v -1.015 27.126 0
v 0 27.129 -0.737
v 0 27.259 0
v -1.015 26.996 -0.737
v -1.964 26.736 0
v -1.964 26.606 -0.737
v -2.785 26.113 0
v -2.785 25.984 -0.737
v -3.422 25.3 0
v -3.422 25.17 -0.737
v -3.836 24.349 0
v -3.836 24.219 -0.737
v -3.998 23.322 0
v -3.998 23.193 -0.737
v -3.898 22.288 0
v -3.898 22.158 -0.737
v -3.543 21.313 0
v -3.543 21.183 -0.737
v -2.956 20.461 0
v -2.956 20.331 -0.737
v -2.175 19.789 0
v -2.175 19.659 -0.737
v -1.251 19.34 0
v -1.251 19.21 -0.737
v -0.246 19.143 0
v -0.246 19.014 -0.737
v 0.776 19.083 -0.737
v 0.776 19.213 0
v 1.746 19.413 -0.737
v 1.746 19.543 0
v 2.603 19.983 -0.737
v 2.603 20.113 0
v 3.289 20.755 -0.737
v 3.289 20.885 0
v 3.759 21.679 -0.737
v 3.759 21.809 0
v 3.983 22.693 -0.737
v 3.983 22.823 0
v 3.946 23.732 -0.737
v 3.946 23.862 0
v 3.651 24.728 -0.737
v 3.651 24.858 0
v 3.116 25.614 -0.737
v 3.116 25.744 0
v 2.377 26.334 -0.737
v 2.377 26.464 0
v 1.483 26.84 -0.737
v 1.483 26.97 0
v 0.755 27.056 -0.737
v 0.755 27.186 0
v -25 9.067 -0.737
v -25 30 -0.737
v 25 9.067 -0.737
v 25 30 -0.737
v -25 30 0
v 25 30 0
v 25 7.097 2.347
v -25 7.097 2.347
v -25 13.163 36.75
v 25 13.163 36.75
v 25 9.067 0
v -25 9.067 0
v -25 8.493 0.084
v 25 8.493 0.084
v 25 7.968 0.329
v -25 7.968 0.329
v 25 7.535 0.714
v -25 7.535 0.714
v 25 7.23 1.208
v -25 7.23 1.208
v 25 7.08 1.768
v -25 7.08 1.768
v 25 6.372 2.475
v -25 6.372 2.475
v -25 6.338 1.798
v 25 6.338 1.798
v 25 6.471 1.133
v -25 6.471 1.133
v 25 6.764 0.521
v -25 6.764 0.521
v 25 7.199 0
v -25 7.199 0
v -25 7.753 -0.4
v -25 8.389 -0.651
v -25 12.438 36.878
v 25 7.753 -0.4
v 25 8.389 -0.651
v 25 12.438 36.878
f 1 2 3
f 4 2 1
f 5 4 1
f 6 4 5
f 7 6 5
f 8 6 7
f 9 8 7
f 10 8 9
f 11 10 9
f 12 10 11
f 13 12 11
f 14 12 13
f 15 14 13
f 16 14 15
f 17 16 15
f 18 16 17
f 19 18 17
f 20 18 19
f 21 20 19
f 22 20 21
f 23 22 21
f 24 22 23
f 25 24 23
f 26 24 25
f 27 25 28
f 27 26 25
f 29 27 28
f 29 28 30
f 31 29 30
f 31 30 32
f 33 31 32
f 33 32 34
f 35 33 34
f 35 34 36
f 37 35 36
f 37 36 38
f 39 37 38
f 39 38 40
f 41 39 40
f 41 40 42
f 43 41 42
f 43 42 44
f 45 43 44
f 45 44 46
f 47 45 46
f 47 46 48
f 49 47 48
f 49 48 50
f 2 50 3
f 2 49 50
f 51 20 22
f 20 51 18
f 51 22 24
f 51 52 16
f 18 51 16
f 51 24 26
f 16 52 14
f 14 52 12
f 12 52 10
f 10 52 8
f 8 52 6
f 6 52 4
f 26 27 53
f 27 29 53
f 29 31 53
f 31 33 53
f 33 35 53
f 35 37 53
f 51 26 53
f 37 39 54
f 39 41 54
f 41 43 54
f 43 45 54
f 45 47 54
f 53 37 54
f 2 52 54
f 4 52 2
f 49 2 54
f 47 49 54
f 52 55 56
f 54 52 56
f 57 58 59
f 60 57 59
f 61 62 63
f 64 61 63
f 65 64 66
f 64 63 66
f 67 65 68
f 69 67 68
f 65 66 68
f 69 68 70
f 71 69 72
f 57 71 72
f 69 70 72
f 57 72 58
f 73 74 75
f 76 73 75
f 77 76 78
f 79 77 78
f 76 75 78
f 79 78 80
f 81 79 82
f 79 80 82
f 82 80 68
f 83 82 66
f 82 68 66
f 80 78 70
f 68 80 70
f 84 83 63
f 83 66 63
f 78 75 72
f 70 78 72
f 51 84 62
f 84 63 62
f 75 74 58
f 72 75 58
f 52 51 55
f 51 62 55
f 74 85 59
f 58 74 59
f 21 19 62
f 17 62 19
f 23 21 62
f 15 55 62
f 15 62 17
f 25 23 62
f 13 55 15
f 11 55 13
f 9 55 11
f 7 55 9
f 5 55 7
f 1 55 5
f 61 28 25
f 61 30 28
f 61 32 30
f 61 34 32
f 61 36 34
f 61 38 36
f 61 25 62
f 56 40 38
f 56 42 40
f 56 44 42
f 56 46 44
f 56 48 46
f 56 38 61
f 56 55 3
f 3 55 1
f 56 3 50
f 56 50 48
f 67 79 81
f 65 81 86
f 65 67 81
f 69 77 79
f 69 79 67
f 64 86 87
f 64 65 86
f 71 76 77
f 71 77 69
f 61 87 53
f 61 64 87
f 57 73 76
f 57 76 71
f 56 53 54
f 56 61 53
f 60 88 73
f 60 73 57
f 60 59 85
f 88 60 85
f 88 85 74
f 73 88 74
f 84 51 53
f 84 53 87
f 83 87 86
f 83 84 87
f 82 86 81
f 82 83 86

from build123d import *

# Parameters (mm, degrees)
SKETCH1_W               = 50
SKETCH1_H               = 60
BASE_FLANGE1_DEPTH      = 0.7366
SKETCHED_START          = -25
SKETCHED_BEND1_DEPTH    = 50
SKETCHED_BEND1_2_DEPTH  = 50
CUT_EXTRUDE1_DEPTH      = 54.090671485
CUT_EXTRUDE1_DEPTH_BACK = 54.090671485
SKETCH8_R               = 4


# Read off the part's stored shape, not the designer's step: Sketched Bend1
# Sheet-metal steps are written as plain solids
with BuildPart() as part:
    # Sketch1 → Base-Flange1 (new body)
    with BuildSketch(Plane.XY):
        Rectangle(SKETCH1_W, SKETCH1_H)
    extrude(amount=-BASE_FLANGE1_DEPTH)

    # Sketched Bend1 outline → Sketched Bend1 (cut)
    with BuildSketch(Plane.YZ.offset(SKETCHED_START)):
        with BuildLine():
            ThreePointArc((9.066731634, -0.7366), (8.062794494, -0.545798456), (7.198850599, 0))
            Line((7.198850599, 0), (-30, 0))
            Line((-30, 0), (-30, -0.7366))
            Line((-30, -0.7366), (9.066731634, -0.7366))
        make_face()
    extrude(amount=SKETCHED_BEND1_DEPTH, mode=Mode.SUBTRACT)

    # Sketched Bend1 2 outline → Sketched Bend1 2 (add)
    with BuildSketch(Plane.YZ.offset(SKETCHED_START)):
        with BuildLine():
            Line((13.163214519, 36.74984988), (12.437805129, 36.877759128))
            Line((12.437805129, 36.877759128), (6.371706737, 2.475205603))
            ThreePointArc((6.371706737, 2.475205603), (6.471218519, 1.132652762), (7.198850599, 0))
            Line((7.198850599, 0), (9.066731634, 0))
            ThreePointArc((9.066731634, 0), (7.534642748, 0.714424781), (7.097116128, 2.347296355))
            Line((7.097116128, 2.347296355), (13.163214519, 36.74984988))
        make_face()
    extrude(amount=SKETCHED_BEND1_2_DEPTH)

    # Sketch8 → Cut-Extrude1 (cut, two sides: drawn at the far end of the back side and taken through both)
    with BuildSketch(Plane(origin=(0, 0.074278928, 0.849012035), x_dir=(1, 0, 0), z_dir=(0, 0.17364817766693058, 0.984807753012208)).offset(-CUT_EXTRUDE1_DEPTH_BACK)):
        with Locations(Location((0, 22.91937018, 0), (0, 0, 90))):
            Circle(SKETCH8_R)
    extrude(amount=CUT_EXTRUDE1_DEPTH + CUT_EXTRUDE1_DEPTH_BACK, mode=Mode.SUBTRACT)


solid = part.part
